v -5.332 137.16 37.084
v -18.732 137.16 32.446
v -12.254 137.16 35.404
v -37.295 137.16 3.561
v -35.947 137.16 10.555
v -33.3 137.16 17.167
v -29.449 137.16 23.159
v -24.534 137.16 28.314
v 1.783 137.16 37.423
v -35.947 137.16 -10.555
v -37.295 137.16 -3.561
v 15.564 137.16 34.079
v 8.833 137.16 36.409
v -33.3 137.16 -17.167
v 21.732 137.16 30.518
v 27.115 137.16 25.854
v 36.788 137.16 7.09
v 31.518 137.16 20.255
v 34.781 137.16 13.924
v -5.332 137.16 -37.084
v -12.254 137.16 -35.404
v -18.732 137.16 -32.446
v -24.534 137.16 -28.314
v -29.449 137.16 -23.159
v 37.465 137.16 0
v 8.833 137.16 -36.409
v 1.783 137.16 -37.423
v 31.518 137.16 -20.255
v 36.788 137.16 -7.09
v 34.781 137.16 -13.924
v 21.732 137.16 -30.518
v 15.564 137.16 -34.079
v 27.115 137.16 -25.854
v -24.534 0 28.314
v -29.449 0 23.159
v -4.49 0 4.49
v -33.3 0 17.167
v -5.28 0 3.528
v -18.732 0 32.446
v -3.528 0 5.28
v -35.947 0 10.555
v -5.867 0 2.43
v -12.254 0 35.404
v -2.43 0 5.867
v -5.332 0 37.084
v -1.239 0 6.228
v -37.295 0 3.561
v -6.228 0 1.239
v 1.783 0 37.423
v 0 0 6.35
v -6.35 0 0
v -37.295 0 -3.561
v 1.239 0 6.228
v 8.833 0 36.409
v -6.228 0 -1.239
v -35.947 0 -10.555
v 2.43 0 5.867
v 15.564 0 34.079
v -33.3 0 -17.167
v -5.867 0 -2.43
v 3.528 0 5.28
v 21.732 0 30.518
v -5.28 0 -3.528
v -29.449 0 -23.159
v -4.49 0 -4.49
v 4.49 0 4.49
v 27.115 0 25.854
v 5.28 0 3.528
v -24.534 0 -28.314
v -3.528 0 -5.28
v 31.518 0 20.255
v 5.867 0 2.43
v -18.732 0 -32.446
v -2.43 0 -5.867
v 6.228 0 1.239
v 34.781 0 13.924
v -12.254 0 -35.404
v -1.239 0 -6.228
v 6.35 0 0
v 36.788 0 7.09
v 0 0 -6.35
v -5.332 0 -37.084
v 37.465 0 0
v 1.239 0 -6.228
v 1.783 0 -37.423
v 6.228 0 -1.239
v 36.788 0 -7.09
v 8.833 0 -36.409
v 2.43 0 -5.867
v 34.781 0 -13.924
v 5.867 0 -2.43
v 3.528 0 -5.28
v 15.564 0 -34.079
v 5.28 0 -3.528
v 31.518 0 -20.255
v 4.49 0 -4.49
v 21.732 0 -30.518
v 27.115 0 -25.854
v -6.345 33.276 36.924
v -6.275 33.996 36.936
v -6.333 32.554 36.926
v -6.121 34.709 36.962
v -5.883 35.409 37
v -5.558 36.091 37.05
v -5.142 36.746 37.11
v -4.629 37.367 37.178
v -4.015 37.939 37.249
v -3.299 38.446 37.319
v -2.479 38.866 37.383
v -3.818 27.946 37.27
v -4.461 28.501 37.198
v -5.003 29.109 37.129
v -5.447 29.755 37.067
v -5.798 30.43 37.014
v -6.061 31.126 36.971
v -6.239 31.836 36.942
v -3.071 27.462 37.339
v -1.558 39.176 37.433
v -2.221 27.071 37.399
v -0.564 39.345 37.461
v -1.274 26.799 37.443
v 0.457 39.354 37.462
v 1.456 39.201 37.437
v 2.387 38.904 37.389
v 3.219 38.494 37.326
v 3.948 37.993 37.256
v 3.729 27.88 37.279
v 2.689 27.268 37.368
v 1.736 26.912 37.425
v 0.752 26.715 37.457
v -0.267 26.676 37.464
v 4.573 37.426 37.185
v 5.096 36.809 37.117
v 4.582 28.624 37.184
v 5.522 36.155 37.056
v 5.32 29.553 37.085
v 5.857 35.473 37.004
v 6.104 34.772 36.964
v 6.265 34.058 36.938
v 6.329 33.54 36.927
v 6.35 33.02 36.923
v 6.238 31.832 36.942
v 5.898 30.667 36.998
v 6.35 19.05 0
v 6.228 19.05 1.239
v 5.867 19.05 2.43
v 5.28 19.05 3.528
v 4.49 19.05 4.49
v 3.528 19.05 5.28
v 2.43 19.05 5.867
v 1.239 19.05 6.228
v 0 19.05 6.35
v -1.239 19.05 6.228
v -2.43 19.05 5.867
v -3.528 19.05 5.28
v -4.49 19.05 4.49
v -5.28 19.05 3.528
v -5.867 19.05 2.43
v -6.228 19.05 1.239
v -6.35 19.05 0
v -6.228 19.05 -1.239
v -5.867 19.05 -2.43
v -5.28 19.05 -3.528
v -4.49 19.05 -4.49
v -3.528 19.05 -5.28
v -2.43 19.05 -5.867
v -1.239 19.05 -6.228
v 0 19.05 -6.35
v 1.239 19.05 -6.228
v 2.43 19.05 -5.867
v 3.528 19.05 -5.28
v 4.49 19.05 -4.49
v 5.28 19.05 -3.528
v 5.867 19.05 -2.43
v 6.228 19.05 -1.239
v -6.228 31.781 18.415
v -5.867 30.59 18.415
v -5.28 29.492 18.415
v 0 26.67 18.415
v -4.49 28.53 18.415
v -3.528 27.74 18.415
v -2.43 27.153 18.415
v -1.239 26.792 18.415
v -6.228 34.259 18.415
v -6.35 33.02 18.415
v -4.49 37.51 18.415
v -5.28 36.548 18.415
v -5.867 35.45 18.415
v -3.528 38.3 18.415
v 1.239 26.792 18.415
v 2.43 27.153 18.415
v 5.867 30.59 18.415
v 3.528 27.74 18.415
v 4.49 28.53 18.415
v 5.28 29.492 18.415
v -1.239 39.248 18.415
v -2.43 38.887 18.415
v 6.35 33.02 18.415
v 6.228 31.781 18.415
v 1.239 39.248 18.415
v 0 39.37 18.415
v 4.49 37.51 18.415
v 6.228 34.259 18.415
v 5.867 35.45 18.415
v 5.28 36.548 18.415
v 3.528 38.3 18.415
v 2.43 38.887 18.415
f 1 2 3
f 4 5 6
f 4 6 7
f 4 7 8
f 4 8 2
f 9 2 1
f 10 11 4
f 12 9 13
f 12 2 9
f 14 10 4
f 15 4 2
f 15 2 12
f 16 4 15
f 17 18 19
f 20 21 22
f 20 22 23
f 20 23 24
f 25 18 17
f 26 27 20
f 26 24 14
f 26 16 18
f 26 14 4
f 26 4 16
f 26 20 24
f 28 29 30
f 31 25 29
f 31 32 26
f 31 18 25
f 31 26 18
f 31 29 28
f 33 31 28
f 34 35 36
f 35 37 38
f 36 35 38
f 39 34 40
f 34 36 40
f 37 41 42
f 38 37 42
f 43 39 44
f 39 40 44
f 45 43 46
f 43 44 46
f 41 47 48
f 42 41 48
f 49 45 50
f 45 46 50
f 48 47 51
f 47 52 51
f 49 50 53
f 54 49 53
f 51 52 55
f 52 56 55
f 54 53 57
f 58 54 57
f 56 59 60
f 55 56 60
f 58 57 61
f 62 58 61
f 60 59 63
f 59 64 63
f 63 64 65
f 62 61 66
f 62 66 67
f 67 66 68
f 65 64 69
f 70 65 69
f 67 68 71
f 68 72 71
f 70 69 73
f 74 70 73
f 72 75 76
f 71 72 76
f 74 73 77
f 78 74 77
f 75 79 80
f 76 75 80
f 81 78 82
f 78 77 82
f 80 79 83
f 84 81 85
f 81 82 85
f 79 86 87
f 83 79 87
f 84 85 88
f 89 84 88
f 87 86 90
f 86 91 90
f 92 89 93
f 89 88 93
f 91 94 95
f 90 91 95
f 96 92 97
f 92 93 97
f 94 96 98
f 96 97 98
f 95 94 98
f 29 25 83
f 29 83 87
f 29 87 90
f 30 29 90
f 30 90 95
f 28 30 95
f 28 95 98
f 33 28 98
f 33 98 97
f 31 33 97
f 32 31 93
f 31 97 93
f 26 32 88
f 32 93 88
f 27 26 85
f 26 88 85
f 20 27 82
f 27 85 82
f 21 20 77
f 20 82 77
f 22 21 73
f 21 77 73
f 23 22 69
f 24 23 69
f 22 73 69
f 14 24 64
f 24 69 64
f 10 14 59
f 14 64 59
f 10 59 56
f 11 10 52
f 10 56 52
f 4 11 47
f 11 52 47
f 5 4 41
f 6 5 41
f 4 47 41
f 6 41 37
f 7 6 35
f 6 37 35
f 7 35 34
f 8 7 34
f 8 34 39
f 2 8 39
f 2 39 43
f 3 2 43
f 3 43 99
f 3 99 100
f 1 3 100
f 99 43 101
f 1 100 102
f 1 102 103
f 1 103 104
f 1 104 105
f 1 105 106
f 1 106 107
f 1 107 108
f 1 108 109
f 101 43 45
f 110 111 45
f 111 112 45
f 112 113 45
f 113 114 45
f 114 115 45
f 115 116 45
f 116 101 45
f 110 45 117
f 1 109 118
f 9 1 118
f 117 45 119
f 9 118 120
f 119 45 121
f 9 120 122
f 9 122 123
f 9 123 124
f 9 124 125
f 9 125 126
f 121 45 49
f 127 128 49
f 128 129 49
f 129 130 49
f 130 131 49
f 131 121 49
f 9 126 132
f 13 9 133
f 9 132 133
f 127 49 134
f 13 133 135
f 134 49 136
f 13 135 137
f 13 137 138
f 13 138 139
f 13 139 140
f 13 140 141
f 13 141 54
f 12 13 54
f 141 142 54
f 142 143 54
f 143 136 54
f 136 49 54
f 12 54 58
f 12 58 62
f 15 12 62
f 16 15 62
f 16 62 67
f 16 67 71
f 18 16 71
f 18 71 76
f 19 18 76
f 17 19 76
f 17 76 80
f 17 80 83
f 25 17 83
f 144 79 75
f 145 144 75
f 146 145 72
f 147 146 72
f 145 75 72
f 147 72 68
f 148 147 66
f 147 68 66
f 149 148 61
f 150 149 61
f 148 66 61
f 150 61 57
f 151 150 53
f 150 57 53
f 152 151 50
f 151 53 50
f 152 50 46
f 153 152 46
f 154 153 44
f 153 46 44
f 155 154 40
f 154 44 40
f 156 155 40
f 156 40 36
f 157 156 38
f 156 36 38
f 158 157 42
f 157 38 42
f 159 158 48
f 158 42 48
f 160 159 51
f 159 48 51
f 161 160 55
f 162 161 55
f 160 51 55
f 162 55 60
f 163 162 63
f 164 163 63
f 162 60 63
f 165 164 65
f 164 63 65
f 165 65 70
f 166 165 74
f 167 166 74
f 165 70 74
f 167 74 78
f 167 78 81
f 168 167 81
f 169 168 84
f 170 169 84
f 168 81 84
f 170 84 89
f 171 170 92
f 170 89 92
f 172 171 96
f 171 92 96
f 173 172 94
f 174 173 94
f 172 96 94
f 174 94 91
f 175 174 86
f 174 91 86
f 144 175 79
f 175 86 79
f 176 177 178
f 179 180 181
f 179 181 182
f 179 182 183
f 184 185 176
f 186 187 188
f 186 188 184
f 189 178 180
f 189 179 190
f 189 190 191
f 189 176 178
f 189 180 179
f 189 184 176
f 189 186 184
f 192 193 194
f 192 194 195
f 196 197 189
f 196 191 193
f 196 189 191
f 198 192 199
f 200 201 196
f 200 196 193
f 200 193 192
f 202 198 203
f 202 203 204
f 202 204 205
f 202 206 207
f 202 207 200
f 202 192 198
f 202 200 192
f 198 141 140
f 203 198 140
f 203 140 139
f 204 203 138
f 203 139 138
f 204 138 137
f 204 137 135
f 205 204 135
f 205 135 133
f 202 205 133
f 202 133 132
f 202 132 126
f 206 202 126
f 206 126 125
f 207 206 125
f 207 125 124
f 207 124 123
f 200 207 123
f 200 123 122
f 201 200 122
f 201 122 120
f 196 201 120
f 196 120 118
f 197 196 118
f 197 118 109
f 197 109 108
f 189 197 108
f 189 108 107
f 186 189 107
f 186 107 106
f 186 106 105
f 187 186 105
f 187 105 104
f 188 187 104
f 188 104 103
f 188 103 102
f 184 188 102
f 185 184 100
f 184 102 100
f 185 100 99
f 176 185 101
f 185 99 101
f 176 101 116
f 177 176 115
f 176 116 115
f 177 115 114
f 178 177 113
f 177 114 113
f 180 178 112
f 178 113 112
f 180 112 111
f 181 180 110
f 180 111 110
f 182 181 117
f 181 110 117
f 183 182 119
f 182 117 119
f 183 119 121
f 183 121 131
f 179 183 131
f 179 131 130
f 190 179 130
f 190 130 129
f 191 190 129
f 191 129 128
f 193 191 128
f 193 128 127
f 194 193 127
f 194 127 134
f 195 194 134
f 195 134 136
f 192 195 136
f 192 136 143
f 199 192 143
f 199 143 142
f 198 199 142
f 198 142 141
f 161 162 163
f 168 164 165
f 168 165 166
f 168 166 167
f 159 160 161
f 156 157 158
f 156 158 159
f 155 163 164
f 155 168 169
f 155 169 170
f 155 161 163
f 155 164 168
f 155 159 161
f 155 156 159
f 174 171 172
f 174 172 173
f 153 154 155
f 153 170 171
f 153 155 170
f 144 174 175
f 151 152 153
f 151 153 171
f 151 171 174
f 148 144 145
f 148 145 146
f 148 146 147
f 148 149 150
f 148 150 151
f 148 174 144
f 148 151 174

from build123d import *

# Parameters (mm, degrees)
SKETCH1_R           = 37.465
BOSS_EXTRUDE1_DEPTH = 137.16
SKETCH3_R           = 6.35
CUT_EXTRUDE1_DEPTH  = 19.05
SKETCH4_R           = 6.35
CUT_EXTRUDE2_DEPTH  = 19.05


with BuildPart() as part:
    # Sketch1 → Boss-Extrude1 (new body)
    with BuildSketch(Plane(origin=(0, 0, 0), x_dir=(1, 0, 0), z_dir=(0, 1, 0))):
        Circle(SKETCH1_R)
    extrude(amount=BOSS_EXTRUDE1_DEPTH)

    # Sketch3 → Cut-Extrude1 (cut)
    with BuildSketch(Plane.XY.offset(37.465)):
        with Locations((0, 33.02)):
            Circle(SKETCH3_R)
    extrude(amount=-CUT_EXTRUDE1_DEPTH, mode=Mode.SUBTRACT)

    # Sketch4 → Cut-Extrude2 (cut)
    with BuildSketch(Plane.XZ):
        Circle(SKETCH4_R)
    extrude(amount=-CUT_EXTRUDE2_DEPTH, mode=Mode.SUBTRACT)


solid = part.part
